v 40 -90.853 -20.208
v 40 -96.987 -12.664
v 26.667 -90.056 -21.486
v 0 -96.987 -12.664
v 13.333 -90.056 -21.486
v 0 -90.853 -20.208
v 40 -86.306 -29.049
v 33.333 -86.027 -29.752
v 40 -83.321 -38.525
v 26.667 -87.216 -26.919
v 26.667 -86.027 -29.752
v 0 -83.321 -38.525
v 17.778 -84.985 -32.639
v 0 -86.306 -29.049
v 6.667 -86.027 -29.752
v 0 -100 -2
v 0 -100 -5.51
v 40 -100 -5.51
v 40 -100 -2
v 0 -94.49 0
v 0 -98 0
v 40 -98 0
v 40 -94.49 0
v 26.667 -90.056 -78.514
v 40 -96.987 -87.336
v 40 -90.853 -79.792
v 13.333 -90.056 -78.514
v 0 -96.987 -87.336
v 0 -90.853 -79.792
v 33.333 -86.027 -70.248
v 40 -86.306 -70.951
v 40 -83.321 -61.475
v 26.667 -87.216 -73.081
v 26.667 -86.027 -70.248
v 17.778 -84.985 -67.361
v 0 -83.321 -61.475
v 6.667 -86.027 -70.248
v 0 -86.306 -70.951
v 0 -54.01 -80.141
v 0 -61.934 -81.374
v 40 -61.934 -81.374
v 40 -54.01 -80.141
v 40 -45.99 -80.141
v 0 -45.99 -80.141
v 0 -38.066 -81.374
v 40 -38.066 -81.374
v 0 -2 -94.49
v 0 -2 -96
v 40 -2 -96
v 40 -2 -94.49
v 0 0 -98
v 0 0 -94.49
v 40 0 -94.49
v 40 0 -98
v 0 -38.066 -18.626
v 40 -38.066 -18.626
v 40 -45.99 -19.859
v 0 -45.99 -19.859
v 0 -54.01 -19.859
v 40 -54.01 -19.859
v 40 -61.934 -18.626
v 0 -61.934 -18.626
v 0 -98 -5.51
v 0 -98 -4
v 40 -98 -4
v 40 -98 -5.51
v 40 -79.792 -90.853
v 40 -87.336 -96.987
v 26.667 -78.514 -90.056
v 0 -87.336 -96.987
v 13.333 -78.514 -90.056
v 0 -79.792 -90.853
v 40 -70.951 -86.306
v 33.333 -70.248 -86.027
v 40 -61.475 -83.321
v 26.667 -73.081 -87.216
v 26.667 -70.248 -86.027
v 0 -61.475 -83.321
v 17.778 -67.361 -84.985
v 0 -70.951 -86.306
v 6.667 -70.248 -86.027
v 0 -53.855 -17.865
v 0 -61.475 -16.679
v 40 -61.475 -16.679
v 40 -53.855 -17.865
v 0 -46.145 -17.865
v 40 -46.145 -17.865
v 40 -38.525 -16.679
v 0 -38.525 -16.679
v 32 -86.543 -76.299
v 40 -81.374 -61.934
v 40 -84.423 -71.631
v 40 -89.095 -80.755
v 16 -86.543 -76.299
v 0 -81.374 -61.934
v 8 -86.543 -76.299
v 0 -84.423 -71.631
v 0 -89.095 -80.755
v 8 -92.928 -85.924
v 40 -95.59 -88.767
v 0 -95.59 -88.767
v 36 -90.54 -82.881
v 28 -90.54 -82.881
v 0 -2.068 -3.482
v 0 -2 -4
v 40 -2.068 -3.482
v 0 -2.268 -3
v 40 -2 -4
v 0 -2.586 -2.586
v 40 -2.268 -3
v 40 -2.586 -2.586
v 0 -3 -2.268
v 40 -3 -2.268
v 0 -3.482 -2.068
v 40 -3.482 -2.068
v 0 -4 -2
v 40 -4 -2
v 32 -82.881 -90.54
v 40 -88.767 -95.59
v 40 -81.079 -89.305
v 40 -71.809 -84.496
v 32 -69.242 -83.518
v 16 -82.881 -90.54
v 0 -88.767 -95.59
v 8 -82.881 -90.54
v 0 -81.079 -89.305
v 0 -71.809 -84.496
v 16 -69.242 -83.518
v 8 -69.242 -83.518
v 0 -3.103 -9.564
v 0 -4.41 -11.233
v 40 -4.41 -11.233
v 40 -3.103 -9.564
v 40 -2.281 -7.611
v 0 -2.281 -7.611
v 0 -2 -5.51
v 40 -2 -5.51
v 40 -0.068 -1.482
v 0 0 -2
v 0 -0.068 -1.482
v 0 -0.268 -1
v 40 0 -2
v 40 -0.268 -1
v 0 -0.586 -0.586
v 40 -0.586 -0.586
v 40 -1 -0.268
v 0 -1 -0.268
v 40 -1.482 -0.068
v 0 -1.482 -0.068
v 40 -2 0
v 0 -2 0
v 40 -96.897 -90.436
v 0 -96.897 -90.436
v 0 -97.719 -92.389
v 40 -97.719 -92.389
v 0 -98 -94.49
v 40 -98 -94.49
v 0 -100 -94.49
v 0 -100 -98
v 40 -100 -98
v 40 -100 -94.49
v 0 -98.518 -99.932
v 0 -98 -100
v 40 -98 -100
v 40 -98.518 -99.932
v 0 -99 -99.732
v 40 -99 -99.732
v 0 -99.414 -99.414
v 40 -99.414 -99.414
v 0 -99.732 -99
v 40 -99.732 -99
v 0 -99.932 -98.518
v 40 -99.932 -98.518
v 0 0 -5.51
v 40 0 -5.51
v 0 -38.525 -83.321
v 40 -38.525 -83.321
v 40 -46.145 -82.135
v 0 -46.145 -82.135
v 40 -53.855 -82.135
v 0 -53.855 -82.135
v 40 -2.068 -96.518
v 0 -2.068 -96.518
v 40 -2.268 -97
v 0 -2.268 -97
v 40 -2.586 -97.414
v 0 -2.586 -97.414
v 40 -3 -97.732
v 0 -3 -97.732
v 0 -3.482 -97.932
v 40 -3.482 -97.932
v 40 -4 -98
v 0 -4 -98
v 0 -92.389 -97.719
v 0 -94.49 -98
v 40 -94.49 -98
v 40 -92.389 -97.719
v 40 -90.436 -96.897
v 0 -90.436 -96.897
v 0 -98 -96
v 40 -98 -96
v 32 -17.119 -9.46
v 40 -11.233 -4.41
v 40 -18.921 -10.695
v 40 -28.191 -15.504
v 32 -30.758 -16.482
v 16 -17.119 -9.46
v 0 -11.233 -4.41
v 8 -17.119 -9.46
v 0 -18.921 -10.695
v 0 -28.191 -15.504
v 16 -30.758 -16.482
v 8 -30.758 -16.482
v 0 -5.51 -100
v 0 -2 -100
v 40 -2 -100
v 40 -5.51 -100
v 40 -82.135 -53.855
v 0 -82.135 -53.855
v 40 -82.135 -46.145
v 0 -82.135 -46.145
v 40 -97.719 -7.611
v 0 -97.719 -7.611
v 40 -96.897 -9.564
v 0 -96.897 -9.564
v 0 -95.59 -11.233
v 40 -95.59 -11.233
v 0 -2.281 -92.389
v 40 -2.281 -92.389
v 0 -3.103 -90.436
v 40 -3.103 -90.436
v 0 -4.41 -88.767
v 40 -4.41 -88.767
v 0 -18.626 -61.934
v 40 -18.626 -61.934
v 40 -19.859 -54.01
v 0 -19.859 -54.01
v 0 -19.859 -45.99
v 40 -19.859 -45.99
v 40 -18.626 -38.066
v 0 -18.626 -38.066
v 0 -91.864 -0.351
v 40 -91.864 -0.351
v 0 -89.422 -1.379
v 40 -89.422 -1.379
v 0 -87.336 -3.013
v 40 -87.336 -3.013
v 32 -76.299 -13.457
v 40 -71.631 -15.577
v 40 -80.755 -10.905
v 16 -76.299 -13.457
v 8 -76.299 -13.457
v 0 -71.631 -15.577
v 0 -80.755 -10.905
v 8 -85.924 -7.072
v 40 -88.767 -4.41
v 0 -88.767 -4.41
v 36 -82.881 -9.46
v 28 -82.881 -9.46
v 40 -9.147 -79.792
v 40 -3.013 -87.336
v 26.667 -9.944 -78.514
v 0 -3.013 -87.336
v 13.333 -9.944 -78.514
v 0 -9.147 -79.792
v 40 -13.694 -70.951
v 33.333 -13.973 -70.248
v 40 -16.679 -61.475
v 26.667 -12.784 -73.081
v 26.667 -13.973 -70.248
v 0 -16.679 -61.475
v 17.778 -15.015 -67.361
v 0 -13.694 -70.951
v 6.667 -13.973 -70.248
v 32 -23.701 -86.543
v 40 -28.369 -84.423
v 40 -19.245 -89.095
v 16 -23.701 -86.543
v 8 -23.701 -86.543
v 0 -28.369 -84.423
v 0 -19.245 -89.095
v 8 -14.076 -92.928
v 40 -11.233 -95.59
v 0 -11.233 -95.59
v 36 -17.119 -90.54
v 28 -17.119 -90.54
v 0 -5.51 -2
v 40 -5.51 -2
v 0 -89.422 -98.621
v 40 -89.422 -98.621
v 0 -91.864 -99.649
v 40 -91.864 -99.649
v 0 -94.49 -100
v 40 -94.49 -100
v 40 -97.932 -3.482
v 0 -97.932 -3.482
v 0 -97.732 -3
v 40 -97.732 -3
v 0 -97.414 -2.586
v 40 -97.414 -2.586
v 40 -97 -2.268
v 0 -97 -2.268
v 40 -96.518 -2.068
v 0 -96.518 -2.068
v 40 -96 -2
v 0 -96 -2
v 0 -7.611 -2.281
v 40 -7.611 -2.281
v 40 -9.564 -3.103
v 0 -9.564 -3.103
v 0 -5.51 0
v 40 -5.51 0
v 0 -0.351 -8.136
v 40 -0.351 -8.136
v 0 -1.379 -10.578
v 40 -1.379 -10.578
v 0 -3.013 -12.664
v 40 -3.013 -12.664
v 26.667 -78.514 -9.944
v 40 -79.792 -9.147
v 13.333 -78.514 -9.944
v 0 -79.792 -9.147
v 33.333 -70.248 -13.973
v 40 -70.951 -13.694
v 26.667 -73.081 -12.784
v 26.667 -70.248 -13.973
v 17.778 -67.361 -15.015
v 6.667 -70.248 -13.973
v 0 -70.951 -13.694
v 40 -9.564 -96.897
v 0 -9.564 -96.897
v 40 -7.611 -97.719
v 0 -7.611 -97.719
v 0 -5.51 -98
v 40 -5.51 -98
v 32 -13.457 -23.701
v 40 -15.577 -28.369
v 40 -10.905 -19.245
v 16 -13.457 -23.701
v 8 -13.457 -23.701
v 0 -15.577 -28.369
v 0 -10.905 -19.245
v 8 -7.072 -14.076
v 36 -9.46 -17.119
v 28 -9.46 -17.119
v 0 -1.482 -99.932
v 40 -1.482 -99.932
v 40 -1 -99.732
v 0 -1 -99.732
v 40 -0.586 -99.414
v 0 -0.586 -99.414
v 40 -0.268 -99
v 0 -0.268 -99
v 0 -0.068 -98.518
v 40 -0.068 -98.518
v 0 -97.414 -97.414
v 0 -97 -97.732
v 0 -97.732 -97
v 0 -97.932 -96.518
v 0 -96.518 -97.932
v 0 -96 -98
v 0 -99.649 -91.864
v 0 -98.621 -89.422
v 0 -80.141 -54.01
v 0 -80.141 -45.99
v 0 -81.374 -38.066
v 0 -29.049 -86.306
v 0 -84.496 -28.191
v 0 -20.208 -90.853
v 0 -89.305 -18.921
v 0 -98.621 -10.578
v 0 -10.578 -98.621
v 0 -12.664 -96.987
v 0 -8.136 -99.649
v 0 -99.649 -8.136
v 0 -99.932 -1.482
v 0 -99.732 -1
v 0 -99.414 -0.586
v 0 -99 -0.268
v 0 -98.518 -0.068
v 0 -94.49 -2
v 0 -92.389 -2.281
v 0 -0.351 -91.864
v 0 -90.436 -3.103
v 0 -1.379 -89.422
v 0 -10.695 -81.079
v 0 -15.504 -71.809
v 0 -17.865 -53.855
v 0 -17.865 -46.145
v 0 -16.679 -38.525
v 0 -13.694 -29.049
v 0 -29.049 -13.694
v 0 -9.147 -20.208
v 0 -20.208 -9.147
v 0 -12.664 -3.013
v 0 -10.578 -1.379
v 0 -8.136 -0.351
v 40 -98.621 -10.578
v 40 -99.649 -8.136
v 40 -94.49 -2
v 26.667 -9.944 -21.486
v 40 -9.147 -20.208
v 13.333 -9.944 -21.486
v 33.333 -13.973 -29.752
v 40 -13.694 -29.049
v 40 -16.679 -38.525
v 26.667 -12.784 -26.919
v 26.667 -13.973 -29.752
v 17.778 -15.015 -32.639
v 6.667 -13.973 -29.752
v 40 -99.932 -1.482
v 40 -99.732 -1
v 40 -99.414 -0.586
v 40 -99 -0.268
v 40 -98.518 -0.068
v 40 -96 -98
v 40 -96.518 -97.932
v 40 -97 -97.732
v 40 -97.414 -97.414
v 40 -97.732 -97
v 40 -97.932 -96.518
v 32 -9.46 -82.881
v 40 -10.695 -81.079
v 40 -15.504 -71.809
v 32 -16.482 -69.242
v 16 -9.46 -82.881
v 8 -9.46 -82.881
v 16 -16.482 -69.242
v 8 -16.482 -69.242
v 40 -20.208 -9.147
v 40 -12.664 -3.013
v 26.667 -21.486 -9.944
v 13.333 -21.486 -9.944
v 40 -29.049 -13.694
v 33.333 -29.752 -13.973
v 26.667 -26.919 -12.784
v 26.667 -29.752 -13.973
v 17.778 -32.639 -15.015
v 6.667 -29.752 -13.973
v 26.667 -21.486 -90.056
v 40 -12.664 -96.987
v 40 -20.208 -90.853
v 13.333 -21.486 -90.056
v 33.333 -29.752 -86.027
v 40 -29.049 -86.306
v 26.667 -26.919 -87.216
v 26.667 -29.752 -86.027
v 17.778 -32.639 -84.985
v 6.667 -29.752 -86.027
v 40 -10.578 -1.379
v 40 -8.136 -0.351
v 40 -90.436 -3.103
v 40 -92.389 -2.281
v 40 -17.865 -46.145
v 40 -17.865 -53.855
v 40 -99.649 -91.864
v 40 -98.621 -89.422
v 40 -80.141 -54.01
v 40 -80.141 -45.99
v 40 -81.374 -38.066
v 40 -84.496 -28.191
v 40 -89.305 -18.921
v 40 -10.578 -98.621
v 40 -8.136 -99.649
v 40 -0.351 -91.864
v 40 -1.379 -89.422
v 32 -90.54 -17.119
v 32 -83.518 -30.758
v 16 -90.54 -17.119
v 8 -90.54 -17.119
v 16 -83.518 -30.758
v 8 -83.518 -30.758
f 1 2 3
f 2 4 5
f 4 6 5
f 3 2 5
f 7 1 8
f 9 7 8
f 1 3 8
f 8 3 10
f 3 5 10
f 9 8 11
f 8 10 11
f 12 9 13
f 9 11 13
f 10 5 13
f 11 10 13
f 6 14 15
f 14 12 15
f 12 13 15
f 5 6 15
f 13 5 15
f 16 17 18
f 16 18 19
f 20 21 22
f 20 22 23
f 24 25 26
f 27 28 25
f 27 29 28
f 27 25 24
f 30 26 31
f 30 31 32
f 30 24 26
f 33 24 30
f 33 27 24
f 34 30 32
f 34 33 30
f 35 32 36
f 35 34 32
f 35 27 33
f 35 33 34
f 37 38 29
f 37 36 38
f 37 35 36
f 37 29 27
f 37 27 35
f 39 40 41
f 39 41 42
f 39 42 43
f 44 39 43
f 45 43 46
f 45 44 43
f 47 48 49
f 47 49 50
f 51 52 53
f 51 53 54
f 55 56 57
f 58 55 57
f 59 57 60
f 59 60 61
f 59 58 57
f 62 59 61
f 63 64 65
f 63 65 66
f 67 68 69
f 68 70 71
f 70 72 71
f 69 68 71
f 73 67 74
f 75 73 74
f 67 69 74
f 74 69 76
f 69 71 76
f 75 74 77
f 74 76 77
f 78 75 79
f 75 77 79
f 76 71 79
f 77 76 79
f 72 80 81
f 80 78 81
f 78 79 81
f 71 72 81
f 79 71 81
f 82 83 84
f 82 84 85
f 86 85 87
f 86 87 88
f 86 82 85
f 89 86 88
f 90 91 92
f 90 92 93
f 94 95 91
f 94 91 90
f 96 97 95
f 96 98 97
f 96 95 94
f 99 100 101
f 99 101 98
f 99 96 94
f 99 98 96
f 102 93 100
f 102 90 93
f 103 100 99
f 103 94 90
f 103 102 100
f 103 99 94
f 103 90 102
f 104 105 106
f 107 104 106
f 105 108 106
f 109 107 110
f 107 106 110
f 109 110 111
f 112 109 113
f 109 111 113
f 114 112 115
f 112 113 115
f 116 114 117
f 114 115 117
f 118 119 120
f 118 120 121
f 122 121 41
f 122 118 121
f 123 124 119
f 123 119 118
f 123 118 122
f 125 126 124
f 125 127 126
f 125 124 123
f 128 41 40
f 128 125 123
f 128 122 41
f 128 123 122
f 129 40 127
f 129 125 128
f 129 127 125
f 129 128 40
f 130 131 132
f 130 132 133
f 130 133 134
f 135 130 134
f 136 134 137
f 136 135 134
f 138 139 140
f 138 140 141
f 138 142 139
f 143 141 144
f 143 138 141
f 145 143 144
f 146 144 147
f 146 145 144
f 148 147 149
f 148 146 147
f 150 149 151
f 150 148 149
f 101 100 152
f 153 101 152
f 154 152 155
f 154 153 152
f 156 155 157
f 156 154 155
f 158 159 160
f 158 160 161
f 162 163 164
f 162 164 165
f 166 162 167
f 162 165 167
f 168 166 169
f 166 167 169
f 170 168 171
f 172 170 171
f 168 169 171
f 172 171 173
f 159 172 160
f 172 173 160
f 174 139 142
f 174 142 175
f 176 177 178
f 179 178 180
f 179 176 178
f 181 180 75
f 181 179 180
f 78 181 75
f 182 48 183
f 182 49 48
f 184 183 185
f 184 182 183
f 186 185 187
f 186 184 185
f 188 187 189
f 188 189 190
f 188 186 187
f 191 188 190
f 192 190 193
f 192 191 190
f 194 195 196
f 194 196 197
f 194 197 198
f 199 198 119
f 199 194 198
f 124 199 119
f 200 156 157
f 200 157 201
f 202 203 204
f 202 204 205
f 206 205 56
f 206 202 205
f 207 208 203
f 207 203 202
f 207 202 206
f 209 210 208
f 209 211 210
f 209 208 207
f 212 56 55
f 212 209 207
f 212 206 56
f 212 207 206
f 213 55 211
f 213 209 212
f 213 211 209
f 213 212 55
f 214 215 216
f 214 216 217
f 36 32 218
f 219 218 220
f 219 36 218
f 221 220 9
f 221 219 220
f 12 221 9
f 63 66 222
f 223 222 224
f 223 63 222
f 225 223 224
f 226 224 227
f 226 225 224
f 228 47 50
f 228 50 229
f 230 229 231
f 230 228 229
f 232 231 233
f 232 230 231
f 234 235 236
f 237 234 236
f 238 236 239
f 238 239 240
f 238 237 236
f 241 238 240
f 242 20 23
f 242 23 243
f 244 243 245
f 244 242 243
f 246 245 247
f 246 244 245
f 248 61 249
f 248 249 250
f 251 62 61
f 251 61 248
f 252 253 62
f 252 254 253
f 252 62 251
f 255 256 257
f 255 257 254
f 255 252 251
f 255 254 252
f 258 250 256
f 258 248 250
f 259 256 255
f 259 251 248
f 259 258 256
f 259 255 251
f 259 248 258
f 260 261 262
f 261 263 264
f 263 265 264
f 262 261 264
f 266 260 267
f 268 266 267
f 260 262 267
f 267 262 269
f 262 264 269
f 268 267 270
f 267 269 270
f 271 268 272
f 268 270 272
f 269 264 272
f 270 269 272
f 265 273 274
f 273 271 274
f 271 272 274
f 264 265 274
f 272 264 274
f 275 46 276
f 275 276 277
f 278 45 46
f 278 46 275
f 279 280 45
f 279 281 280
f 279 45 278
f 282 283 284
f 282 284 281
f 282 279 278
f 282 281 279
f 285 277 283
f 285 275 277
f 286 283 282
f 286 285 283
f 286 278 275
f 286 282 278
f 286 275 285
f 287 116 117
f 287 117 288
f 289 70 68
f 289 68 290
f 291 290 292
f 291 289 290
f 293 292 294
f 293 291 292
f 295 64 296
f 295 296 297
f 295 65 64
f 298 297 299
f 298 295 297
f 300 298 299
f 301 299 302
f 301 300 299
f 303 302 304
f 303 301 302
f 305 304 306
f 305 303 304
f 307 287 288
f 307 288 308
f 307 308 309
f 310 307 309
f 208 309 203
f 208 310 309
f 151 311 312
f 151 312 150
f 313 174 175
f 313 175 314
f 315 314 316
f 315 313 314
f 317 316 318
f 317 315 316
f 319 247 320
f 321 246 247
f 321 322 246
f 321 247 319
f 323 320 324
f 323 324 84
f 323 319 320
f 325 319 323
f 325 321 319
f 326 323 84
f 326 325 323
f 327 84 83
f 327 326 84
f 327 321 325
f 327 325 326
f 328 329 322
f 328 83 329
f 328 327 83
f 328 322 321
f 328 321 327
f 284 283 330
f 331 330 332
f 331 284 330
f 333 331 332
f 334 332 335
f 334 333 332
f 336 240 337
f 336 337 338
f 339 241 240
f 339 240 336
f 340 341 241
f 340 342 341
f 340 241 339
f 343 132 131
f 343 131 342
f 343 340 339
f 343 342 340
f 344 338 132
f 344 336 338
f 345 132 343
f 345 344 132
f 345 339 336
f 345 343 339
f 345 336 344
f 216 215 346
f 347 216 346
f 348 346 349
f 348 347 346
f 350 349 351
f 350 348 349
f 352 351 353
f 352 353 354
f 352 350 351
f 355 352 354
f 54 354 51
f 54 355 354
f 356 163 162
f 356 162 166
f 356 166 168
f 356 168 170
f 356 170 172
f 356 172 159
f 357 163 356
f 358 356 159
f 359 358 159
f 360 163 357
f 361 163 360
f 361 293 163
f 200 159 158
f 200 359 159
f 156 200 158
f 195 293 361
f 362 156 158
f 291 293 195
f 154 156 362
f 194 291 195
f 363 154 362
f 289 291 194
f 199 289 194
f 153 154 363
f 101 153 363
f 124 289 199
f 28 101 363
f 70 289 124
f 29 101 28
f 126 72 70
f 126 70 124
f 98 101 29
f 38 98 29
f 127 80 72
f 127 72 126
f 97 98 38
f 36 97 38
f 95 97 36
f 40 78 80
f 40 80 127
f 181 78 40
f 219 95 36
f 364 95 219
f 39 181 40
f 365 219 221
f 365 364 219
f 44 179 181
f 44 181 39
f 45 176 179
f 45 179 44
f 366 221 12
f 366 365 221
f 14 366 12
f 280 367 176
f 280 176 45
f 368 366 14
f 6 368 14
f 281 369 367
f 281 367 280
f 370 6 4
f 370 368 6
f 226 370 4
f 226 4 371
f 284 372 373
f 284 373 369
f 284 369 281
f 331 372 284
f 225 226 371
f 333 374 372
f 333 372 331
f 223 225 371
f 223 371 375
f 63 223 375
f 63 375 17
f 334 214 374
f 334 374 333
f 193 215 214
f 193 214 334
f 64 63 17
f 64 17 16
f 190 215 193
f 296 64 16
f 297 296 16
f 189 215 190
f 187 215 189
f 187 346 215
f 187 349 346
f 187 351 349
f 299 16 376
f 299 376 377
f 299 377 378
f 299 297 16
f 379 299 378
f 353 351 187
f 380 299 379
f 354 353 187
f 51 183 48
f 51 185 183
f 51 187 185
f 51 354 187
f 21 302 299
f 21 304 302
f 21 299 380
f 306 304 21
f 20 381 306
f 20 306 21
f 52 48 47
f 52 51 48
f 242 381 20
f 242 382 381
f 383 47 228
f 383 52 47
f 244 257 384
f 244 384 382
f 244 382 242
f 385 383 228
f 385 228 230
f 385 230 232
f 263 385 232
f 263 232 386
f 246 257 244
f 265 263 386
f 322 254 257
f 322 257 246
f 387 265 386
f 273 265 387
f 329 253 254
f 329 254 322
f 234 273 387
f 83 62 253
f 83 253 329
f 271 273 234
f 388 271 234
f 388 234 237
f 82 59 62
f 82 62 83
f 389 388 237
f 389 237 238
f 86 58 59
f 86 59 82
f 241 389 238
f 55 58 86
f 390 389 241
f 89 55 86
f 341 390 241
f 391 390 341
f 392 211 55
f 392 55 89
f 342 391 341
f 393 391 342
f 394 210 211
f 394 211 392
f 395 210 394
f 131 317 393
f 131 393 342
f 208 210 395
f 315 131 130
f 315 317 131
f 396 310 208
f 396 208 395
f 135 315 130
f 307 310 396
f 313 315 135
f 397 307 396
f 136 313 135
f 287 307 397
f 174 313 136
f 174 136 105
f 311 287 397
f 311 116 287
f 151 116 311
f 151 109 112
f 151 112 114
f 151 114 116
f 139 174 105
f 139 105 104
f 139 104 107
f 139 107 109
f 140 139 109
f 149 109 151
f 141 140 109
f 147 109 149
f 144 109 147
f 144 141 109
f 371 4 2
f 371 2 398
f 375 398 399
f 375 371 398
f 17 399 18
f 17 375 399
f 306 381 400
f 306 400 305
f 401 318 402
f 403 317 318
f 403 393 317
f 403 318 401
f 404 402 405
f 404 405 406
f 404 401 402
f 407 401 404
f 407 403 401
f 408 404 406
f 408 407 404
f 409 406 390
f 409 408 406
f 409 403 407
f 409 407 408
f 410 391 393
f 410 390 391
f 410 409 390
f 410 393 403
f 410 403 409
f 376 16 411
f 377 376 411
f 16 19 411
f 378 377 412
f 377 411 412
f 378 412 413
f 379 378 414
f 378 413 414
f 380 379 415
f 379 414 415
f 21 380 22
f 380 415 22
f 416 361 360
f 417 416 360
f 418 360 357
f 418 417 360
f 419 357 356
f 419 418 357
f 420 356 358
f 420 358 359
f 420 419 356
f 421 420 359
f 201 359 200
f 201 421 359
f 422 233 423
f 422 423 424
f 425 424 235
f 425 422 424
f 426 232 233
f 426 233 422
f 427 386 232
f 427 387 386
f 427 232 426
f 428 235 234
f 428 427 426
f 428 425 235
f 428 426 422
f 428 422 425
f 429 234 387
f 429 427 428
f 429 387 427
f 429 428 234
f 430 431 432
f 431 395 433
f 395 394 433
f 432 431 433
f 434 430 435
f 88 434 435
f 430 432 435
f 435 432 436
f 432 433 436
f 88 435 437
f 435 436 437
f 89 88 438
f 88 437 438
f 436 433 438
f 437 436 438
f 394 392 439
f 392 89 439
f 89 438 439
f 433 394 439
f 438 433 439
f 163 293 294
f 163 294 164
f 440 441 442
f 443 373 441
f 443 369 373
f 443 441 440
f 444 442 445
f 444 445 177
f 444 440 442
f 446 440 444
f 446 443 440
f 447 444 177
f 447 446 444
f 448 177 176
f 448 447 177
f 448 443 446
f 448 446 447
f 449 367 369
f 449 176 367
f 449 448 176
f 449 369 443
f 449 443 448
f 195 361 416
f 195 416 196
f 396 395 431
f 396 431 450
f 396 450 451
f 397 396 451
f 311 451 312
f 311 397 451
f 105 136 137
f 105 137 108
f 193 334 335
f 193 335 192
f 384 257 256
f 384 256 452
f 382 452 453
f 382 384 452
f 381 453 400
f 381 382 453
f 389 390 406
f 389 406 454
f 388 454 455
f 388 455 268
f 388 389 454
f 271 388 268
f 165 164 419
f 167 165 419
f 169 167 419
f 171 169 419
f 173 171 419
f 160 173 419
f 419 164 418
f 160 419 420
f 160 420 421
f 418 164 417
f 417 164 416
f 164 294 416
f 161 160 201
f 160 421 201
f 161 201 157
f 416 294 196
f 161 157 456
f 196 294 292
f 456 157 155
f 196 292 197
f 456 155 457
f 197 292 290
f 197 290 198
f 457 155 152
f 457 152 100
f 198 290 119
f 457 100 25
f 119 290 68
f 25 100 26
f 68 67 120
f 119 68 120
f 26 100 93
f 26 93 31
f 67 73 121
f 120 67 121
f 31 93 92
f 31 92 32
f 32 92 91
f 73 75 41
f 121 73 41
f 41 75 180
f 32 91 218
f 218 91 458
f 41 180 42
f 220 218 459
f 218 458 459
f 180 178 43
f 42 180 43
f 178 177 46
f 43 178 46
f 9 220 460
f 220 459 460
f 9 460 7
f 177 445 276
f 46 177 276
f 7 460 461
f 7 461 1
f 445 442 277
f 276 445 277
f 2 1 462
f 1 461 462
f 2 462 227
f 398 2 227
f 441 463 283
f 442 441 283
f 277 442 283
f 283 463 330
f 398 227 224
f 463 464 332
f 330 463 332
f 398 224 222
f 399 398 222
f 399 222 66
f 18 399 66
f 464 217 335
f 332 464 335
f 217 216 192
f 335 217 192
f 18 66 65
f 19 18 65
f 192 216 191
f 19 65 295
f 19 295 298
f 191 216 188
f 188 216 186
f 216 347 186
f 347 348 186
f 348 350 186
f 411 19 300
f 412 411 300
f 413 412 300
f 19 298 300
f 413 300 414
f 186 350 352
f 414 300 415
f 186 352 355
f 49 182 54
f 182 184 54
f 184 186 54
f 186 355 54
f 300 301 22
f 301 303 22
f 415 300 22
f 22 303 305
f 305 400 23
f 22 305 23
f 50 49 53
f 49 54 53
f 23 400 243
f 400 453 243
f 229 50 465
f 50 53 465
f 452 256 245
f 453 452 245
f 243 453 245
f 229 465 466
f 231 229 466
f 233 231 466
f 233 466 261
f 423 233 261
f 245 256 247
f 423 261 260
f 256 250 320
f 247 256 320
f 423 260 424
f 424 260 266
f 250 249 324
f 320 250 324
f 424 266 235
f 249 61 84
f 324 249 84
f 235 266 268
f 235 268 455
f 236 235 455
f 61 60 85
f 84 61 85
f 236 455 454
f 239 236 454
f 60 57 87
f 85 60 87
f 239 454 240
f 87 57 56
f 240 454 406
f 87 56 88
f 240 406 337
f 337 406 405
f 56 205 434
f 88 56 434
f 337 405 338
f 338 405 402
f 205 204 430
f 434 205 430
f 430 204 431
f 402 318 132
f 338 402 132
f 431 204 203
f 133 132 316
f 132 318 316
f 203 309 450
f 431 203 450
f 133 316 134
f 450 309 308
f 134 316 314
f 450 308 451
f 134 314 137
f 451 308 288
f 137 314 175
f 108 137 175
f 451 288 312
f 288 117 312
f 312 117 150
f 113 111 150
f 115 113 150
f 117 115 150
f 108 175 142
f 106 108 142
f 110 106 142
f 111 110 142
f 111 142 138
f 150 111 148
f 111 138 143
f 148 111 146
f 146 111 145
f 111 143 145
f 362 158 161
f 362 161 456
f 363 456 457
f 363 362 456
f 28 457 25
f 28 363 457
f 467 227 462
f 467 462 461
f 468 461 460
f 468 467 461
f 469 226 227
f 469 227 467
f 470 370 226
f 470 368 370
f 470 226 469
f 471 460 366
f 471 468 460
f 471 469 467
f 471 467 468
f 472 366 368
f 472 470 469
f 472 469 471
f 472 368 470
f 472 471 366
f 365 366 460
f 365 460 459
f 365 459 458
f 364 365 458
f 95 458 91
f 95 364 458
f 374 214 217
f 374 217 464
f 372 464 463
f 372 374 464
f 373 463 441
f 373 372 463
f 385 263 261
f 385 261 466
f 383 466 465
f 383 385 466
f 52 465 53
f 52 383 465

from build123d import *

# Parameters (mm, degrees)
BOSS_EXTRUDE1_DEPTH = 40
FILLET1_R           = 2


with BuildPart() as part:
    # Sketch1 → Boss-Extrude1 (new body)
    with BuildSketch(Plane(origin=(0, 0, 0), x_dir=(0, 0, -1), z_dir=(1, 0, 0))):
        with BuildLine():
            Line((100, 0), (100, -5.509803926))
            ThreePointArc((100, -5.509803926), (99.216139085, -9.390883719), (96.987443928, -12.663518161))
            add(Edge.make_bspline(
                [(96.987443928, -12.663518161), (94.284956793, -15.303192699), (88.725985213, -22.501160026), (85.001584131, -31.833431523), (83.50630434, -37.738521084), (83.320771704, -38.525392743)],
                knots=[0.087567714, 0.087567714, 0.087567714, 0.087567714, 0.336049895, 0.688961666, 0.74236025, 0.74236025, 0.74236025, 0.74236025], degree=3))
            ThreePointArc((83.320771704, -38.525392743), (81.98629737, -50), (83.320771704, -61.474607257))
            add(Edge.make_bspline(
                [(96.987443928, -87.336481839), (94.284956793, -84.696807301), (88.725985213, -77.498839974), (85.001584131, -68.166568477), (83.50630434, -62.261478916), (83.320771704, -61.474607257)],
                knots=[0.087567714, 0.087567714, 0.087567714, 0.087567714, 0.336049895, 0.688961666, 0.74236025, 0.74236025, 0.74236025, 0.74236025], degree=3))
            ThreePointArc((96.987443928, -87.336481839), (99.216139085, -90.609116281), (100, -94.490196074))
            Line((100, -94.490196074), (100, -100))
            Line((100, -100), (94.490196074, -100))
            ThreePointArc((94.490196074, -100), (90.609116281, -99.216139085), (87.336481839, -96.987443928))
            add(Edge.make_bspline(
                [(87.336481839, -96.987443928), (84.696807301, -94.284956793), (77.498839974, -88.725985213), (68.166568477, -85.001584131), (62.261478916, -83.50630434), (61.474607257, -83.320771704)],
                knots=[0.087567714, 0.087567714, 0.087567714, 0.087567714, 0.336049895, 0.688961666, 0.74236025, 0.74236025, 0.74236025, 0.74236025], degree=3))
            ThreePointArc((61.474607257, -83.320771704), (50, -81.98629737), (38.525392743, -83.320771704))
            add(Edge.make_bspline(
                [(12.663518161, -96.987443928), (15.303192699, -94.284956793), (22.501160026, -88.725985213), (31.833431523, -85.001584131), (37.738521084, -83.50630434), (38.525392743, -83.320771704)],
                knots=[0.087567714, 0.087567714, 0.087567714, 0.087567714, 0.336049895, 0.688961666, 0.74236025, 0.74236025, 0.74236025, 0.74236025], degree=3))
            ThreePointArc((12.663518161, -96.987443928), (9.390883719, -99.216139085), (5.509803926, -100))
            Line((5.509803926, -100), (0, -100))
            Line((0, -100), (0, -94.490196074))
            ThreePointArc((0, -94.490196074), (0.783860915, -90.609116281), (3.012556072, -87.336481839))
            add(Edge.make_bspline(
                [(3.012556072, -87.336481839), (5.715043207, -84.696807301), (11.274014787, -77.498839974), (14.998415869, -68.166568477), (16.49369566, -62.261478916), (16.679228296, -61.474607257)],
                knots=[0.087567714, 0.087567714, 0.087567714, 0.087567714, 0.336049895, 0.688961666, 0.74236025, 0.74236025, 0.74236025, 0.74236025], degree=3))
            ThreePointArc((16.679228296, -61.474607257), (18.01370263, -50), (16.679228296, -38.525392743))
            add(Edge.make_bspline(
                [(3.012556072, -12.663518161), (5.715043207, -15.303192699), (11.274014787, -22.501160026), (14.998415869, -31.833431523), (16.49369566, -37.738521084), (16.679228296, -38.525392743)],
                knots=[0.087567714, 0.087567714, 0.087567714, 0.087567714, 0.336049895, 0.688961666, 0.74236025, 0.74236025, 0.74236025, 0.74236025], degree=3))
            ThreePointArc((3.012556072, -12.663518161), (0.783860915, -9.390883719), (0, -5.509803926))
            Line((0, -5.509803926), (0, 0))
            Line((0, 0), (5.509803926, 0))
            ThreePointArc((5.509803926, 0), (9.390883719, -0.783860915), (12.663518161, -3.012556072))
            add(Edge.make_bspline(
                [(12.663518161, -3.012556072), (15.303192699, -5.715043207), (22.501160026, -11.274014787), (31.833431523, -14.998415869), (37.738521084, -16.49369566), (38.525392743, -16.679228296)],
                knots=[0.087567714, 0.087567714, 0.087567714, 0.087567714, 0.336049895, 0.688961666, 0.74236025, 0.74236025, 0.74236025, 0.74236025], degree=3))
            ThreePointArc((38.525392743, -16.679228296), (50, -18.01370263), (61.474607257, -16.679228296))
            add(Edge.make_bspline(
                [(87.336481839, -3.012556072), (84.696807301, -5.715043207), (77.498839974, -11.274014787), (68.166568477, -14.998415869), (62.261478916, -16.49369566), (61.474607257, -16.679228296)],
                knots=[0.087567714, 0.087567714, 0.087567714, 0.087567714, 0.336049895, 0.688961666, 0.74236025, 0.74236025, 0.74236025, 0.74236025], degree=3))
            ThreePointArc((87.336481839, -3.012556072), (90.609116281, -0.783860915), (94.490196074, 0))
            Line((94.490196074, 0), (100, 0))
        make_face()
        with BuildLine():
            Line((2, -2), (2, -5.509803926))
            ThreePointArc((2, -5.509803926), (2.627088732, -8.61466776), (4.410044858, -11.232775314))
            add(Edge.make_bspline(
                [(4.410044858, -11.232775314), (5.338828529, -12.139971717), (7.119384177, -14.045499285), (10.298925927, -18.104117855), (13.619253938, -23.620299694), (16.6302594, -30.724007948), (18.043201909, -35.595313625), (18.625849322, -38.066408453)],
                knots=[0.087567714, 0.087567714, 0.087567714, 0.087567714, 0.169416781, 0.251265848, 0.414963982, 0.578662116, 0.74236025, 0.74236025, 0.74236025, 0.74236025], degree=3))
            ThreePointArc((18.625849322, -38.066408453), (20.01370263, -50), (18.625849322, -61.933591547))
            add(Edge.make_bspline(
                [(18.625849322, -61.933591547), (18.043201909, -64.404686375), (16.6302594, -69.275992052), (13.619253938, -76.379700306), (10.298925927, -81.895882145), (7.119384178, -85.954500715), (5.338828529, -87.860028283), (4.410044858, -88.767224686)],
                knots=[0.087567714, 0.087567714, 0.087567714, 0.087567714, 0.251265848, 0.414963982, 0.578662116, 0.660511183, 0.74236025, 0.74236025, 0.74236025, 0.74236025], degree=3))
            ThreePointArc((4.410044858, -88.767224686), (2.627088732, -91.38533224), (2, -94.490196074))
            Line((2, -94.490196074), (2, -98))
            Line((2, -98), (5.509803926, -98))
            ThreePointArc((5.509803926, -98), (8.61466776, -97.372911268), (11.232775314, -95.589955142))
            add(Edge.make_bspline(
                [(11.232775314, -95.589955142), (12.139971717, -94.661171471), (14.045499285, -92.880615823), (18.104117855, -89.701074073), (23.620299694, -86.380746062), (30.724007948, -83.3697406), (35.595313625, -81.956798091), (38.066408453, -81.374150678)],
                knots=[0.087567714, 0.087567714, 0.087567714, 0.087567714, 0.169416781, 0.251265848, 0.414963982, 0.578662116, 0.74236025, 0.74236025, 0.74236025, 0.74236025], degree=3))
            ThreePointArc((38.066408453, -81.374150678), (50, -79.98629737), (61.933591547, -81.374150678))
            add(Edge.make_bspline(
                [(61.933591547, -81.374150678), (64.404686375, -81.956798091), (69.275992052, -83.3697406), (76.379700306, -86.380746062), (81.895882145, -89.701074073), (85.954500715, -92.880615823), (87.860028283, -94.661171471), (88.767224686, -95.589955142)],
                knots=[0.087567714, 0.087567714, 0.087567714, 0.087567714, 0.251265848, 0.414963982, 0.578662116, 0.660511183, 0.74236025, 0.74236025, 0.74236025, 0.74236025], degree=3))
            ThreePointArc((88.767224686, -95.589955142), (91.38533224, -97.372911268), (94.490196074, -98))
            Line((94.490196074, -98), (98, -98))
            Line((98, -98), (98, -94.490196074))
            ThreePointArc((98, -94.490196074), (97.372911268, -91.38533224), (95.589955142, -88.767224686))
            add(Edge.make_bspline(
                [(95.589955142, -88.767224686), (94.661171471, -87.860028283), (92.880615823, -85.954500715), (89.701074073, -81.895882145), (86.380746062, -76.379700306), (83.3697406, -69.275992052), (81.956798091, -64.404686375), (81.374150678, -61.933591547)],
                knots=[0.087567714, 0.087567714, 0.087567714, 0.087567714, 0.169416781, 0.251265848, 0.414963982, 0.578662116, 0.74236025, 0.74236025, 0.74236025, 0.74236025], degree=3))
            ThreePointArc((81.374150678, -61.933591547), (79.98629737, -50), (81.374150678, -38.066408453))
            add(Edge.make_bspline(
                [(81.374150678, -38.066408453), (81.956798091, -35.595313625), (83.3697406, -30.724007948), (86.380746062, -23.620299694), (89.701074073, -18.104117855), (92.880615823, -14.045499285), (94.661171471, -12.139971717), (95.589955142, -11.232775314)],
                knots=[0.087567714, 0.087567714, 0.087567714, 0.087567714, 0.251265848, 0.414963982, 0.578662116, 0.660511183, 0.74236025, 0.74236025, 0.74236025, 0.74236025], degree=3))
            ThreePointArc((95.589955142, -11.232775314), (97.372911268, -8.61466776), (98, -5.509803926))
            Line((98, -5.509803926), (98, -2))
            Line((98, -2), (94.490196074, -2))
            ThreePointArc((94.490196074, -2), (91.38533224, -2.627088732), (88.767224686, -4.410044858))
            add(Edge.make_bspline(
                [(88.767224686, -4.410044858), (87.860028283, -5.338828529), (85.954500715, -7.119384177), (81.895882145, -10.298925927), (76.379700306, -13.619253938), (69.275992052, -16.6302594), (64.404686375, -18.043201909), (61.933591547, -18.625849322)],
                knots=[0.087567714, 0.087567714, 0.087567714, 0.087567714, 0.169416781, 0.251265848, 0.414963982, 0.578662116, 0.74236025, 0.74236025, 0.74236025, 0.74236025], degree=3))
            ThreePointArc((61.933591547, -18.625849322), (50, -20.01370263), (38.066408453, -18.625849322))
            add(Edge.make_bspline(
                [(38.066408453, -18.625849322), (35.595313625, -18.043201909), (30.724007948, -16.6302594), (23.620299694, -13.619253938), (18.104117855, -10.298925927), (14.045499285, -7.119384177), (12.139971717, -5.338828529), (11.232775314, -4.410044858)],
                knots=[0.087567714, 0.087567714, 0.087567714, 0.087567714, 0.251265848, 0.414963982, 0.578662116, 0.660511183, 0.74236025, 0.74236025, 0.74236025, 0.74236025], degree=3))
            ThreePointArc((11.232775314, -4.410044858), (8.61466776, -2.627088732), (5.509803926, -2))
            Line((5.509803926, -2), (2, -2))
        make_face(mode=Mode.SUBTRACT)
    extrude(amount=BOSS_EXTRUDE1_DEPTH)

    # Fillet1
    fillet1_edges = [part.edges().sort_by_distance(p)[0] for p in [
        (20, 0, 0),
        (20, 0, -100),
        (20, -100, -100),
        (20, -100, 0),
        (20, -2, -2),
        (20, -98, -2),
        (20, -98, -98),
        (20, -2, -98),
    ]]
    fillet(fillet1_edges, radius=FILLET1_R)


solid = part.part
